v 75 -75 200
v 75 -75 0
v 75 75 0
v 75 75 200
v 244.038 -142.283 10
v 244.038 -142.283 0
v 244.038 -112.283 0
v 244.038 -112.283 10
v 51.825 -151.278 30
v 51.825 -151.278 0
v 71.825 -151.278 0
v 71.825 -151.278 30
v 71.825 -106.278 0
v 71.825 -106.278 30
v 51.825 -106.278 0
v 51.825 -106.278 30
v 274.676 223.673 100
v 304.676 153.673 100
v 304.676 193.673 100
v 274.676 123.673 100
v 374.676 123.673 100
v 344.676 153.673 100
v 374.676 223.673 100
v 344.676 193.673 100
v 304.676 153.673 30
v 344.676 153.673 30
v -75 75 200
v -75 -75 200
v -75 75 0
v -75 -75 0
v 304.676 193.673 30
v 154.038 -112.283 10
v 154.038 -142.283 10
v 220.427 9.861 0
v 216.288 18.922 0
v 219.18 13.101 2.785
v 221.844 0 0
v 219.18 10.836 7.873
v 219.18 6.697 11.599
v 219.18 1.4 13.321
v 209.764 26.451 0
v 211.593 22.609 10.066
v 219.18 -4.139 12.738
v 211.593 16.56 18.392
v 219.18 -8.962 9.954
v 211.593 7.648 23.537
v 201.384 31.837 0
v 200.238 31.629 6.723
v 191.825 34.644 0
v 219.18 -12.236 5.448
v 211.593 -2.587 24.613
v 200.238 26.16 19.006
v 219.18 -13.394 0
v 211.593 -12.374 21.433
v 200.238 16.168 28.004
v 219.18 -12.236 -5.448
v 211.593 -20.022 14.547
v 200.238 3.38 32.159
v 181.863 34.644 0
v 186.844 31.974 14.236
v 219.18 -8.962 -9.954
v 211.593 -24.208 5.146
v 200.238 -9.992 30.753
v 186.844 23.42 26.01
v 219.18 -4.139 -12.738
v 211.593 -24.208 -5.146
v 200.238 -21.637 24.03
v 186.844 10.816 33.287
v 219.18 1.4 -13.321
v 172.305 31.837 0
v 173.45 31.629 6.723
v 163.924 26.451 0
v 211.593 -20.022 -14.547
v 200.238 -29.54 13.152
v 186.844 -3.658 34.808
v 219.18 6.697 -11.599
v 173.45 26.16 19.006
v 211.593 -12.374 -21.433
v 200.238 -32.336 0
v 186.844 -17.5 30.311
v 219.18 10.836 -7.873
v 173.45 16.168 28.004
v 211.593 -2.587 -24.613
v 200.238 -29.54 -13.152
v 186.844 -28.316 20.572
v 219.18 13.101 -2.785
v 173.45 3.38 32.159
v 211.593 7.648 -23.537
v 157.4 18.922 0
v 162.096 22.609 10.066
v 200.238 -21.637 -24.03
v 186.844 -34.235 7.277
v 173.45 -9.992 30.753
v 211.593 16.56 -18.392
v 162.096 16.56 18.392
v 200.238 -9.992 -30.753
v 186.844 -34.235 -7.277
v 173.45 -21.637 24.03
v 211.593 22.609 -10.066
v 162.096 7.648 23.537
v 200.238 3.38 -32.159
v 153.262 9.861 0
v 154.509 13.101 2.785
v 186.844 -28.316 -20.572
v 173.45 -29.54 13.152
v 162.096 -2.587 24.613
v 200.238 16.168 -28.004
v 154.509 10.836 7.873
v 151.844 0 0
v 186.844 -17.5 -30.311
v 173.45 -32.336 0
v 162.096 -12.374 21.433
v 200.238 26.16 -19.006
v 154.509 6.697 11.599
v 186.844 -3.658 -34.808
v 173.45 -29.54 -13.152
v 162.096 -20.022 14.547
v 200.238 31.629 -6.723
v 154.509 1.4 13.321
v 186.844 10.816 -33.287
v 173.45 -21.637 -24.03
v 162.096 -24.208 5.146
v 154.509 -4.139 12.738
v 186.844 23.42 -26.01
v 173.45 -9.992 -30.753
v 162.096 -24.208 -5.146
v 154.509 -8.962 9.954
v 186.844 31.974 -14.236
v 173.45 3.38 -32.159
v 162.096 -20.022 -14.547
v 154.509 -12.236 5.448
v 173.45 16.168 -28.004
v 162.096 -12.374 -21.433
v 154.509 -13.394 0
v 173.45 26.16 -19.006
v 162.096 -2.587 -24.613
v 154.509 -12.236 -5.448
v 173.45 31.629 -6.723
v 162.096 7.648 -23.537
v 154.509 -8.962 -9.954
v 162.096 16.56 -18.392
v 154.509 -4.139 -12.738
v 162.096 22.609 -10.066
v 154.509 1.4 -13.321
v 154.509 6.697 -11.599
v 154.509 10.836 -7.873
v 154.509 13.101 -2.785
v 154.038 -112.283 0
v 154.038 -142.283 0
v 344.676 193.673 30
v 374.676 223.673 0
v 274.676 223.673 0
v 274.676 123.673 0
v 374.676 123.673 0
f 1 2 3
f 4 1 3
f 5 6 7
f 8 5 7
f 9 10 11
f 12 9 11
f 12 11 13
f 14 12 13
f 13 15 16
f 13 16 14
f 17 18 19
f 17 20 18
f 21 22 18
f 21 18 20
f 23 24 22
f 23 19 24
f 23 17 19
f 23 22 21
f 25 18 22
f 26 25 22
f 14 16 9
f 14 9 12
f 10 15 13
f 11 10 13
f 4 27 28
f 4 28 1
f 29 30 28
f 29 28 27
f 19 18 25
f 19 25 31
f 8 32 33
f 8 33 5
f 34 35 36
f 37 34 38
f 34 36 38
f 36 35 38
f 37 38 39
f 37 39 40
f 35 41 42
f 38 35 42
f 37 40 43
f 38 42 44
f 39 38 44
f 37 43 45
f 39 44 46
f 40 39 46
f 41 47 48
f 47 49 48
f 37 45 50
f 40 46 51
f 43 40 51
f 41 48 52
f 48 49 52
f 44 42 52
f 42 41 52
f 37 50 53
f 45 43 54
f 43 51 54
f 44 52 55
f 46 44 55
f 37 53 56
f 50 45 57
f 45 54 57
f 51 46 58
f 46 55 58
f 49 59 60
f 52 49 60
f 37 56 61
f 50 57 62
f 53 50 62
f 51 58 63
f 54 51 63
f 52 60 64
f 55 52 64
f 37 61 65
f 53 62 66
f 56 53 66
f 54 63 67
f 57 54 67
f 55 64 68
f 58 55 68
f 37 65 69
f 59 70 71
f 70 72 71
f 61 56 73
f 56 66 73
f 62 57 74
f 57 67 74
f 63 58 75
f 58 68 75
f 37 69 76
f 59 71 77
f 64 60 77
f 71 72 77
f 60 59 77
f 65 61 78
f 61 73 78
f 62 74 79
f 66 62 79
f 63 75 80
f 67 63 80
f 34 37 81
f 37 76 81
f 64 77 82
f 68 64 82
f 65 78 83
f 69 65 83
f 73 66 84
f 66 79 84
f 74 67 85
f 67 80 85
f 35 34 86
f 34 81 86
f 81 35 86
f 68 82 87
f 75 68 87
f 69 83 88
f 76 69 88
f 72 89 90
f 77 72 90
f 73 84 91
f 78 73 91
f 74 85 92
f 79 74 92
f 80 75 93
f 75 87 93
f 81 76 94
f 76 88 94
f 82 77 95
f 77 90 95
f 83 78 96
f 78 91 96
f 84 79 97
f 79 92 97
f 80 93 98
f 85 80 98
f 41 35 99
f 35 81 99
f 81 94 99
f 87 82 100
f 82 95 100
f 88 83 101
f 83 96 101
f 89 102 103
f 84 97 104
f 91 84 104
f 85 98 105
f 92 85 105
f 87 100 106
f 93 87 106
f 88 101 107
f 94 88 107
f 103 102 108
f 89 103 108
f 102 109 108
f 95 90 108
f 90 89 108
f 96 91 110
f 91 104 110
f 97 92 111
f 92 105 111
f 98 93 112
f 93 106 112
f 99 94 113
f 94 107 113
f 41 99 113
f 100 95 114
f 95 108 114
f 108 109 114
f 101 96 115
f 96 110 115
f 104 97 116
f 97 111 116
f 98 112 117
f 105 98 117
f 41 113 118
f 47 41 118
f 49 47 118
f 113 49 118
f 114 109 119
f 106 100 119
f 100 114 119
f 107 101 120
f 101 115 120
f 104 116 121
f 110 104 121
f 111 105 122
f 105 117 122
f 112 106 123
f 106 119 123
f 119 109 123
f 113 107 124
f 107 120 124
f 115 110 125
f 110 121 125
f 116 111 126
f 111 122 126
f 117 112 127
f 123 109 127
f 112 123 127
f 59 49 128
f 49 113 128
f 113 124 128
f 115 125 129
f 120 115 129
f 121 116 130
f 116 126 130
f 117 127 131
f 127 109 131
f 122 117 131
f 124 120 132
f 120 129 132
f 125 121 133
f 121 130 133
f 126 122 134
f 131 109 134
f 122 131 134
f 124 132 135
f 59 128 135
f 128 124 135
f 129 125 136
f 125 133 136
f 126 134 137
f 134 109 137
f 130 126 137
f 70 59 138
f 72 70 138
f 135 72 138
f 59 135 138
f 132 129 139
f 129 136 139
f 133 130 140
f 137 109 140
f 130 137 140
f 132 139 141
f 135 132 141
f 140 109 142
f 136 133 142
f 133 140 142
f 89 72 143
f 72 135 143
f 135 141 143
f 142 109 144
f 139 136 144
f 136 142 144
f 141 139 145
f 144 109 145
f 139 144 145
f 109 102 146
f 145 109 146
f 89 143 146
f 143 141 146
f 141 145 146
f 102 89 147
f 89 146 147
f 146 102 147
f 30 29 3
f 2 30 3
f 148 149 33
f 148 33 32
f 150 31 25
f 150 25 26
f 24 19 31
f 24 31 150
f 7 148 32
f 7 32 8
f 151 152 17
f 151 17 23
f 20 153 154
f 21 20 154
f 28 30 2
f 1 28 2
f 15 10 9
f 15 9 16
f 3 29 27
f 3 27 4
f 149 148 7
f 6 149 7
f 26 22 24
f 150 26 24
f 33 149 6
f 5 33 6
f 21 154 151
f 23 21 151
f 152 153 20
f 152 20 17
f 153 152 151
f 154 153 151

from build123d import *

# Parameters (mm, degrees)
F0_W     = 150
F0_H     = 150
F1_DEPTH = 200
F4_W     = 20
F4_H     = 45
F5_DEPTH = 30
F6_W     = 90
F6_H     = 30
F7_DEPTH = 10
F8_W     = 100
F8_H     = 100
F9_DEPTH = 100
F10_T    = -30


with BuildPart() as f1:
    # F0 (on Top) → F1 (new body)
    with BuildSketch(Plane.XY):
        Rectangle(F0_W, F0_H)
    extrude(amount=F1_DEPTH)


with BuildPart() as f3:
    # F2 (on Top) → F3 (revolve)
    with BuildSketch(Plane.XY):
        with BuildLine():
            ThreePointArc((221.844355, 0), (186.844355, 35), (151.844355, 0))
            Line((151.844355, 0), (221.844355, 0))
        make_face()
    revolve(axis=Axis((186.844355, 0, 0), (1, 0, 0)))


with BuildPart() as f5:
    # F4 (on Top) → F5 (new body)
    with BuildSketch(Plane.XY):
        with Locations((61.825072, -128.778283)):
            Rectangle(F4_W, F4_H)
    extrude(amount=F5_DEPTH)


with BuildPart() as f7:
    # F6 (on Top) → F7 (new body)
    with BuildSketch(Plane.XY):
        with Locations((199.038319, -127.283359)):
            Rectangle(F6_W, F6_H)
    extrude(amount=F7_DEPTH)


with BuildPart() as f9:
    # F8 (on Top) → F9 (new body)
    with BuildSketch(Plane.XY):
        with Locations((324.675895, 173.673192)):
            Rectangle(F8_W, F8_H)
    extrude(amount=F9_DEPTH)

    # F10
    f10_openings = [f9.faces().sort_by_distance(p)[0] for p in [
        (324.675895, 173.673192, 100),
    ]]
    offset(amount=F10_T, openings=f10_openings)


solid = Compound([f1.part, f3.part, f5.part, f7.part, f9.part])
